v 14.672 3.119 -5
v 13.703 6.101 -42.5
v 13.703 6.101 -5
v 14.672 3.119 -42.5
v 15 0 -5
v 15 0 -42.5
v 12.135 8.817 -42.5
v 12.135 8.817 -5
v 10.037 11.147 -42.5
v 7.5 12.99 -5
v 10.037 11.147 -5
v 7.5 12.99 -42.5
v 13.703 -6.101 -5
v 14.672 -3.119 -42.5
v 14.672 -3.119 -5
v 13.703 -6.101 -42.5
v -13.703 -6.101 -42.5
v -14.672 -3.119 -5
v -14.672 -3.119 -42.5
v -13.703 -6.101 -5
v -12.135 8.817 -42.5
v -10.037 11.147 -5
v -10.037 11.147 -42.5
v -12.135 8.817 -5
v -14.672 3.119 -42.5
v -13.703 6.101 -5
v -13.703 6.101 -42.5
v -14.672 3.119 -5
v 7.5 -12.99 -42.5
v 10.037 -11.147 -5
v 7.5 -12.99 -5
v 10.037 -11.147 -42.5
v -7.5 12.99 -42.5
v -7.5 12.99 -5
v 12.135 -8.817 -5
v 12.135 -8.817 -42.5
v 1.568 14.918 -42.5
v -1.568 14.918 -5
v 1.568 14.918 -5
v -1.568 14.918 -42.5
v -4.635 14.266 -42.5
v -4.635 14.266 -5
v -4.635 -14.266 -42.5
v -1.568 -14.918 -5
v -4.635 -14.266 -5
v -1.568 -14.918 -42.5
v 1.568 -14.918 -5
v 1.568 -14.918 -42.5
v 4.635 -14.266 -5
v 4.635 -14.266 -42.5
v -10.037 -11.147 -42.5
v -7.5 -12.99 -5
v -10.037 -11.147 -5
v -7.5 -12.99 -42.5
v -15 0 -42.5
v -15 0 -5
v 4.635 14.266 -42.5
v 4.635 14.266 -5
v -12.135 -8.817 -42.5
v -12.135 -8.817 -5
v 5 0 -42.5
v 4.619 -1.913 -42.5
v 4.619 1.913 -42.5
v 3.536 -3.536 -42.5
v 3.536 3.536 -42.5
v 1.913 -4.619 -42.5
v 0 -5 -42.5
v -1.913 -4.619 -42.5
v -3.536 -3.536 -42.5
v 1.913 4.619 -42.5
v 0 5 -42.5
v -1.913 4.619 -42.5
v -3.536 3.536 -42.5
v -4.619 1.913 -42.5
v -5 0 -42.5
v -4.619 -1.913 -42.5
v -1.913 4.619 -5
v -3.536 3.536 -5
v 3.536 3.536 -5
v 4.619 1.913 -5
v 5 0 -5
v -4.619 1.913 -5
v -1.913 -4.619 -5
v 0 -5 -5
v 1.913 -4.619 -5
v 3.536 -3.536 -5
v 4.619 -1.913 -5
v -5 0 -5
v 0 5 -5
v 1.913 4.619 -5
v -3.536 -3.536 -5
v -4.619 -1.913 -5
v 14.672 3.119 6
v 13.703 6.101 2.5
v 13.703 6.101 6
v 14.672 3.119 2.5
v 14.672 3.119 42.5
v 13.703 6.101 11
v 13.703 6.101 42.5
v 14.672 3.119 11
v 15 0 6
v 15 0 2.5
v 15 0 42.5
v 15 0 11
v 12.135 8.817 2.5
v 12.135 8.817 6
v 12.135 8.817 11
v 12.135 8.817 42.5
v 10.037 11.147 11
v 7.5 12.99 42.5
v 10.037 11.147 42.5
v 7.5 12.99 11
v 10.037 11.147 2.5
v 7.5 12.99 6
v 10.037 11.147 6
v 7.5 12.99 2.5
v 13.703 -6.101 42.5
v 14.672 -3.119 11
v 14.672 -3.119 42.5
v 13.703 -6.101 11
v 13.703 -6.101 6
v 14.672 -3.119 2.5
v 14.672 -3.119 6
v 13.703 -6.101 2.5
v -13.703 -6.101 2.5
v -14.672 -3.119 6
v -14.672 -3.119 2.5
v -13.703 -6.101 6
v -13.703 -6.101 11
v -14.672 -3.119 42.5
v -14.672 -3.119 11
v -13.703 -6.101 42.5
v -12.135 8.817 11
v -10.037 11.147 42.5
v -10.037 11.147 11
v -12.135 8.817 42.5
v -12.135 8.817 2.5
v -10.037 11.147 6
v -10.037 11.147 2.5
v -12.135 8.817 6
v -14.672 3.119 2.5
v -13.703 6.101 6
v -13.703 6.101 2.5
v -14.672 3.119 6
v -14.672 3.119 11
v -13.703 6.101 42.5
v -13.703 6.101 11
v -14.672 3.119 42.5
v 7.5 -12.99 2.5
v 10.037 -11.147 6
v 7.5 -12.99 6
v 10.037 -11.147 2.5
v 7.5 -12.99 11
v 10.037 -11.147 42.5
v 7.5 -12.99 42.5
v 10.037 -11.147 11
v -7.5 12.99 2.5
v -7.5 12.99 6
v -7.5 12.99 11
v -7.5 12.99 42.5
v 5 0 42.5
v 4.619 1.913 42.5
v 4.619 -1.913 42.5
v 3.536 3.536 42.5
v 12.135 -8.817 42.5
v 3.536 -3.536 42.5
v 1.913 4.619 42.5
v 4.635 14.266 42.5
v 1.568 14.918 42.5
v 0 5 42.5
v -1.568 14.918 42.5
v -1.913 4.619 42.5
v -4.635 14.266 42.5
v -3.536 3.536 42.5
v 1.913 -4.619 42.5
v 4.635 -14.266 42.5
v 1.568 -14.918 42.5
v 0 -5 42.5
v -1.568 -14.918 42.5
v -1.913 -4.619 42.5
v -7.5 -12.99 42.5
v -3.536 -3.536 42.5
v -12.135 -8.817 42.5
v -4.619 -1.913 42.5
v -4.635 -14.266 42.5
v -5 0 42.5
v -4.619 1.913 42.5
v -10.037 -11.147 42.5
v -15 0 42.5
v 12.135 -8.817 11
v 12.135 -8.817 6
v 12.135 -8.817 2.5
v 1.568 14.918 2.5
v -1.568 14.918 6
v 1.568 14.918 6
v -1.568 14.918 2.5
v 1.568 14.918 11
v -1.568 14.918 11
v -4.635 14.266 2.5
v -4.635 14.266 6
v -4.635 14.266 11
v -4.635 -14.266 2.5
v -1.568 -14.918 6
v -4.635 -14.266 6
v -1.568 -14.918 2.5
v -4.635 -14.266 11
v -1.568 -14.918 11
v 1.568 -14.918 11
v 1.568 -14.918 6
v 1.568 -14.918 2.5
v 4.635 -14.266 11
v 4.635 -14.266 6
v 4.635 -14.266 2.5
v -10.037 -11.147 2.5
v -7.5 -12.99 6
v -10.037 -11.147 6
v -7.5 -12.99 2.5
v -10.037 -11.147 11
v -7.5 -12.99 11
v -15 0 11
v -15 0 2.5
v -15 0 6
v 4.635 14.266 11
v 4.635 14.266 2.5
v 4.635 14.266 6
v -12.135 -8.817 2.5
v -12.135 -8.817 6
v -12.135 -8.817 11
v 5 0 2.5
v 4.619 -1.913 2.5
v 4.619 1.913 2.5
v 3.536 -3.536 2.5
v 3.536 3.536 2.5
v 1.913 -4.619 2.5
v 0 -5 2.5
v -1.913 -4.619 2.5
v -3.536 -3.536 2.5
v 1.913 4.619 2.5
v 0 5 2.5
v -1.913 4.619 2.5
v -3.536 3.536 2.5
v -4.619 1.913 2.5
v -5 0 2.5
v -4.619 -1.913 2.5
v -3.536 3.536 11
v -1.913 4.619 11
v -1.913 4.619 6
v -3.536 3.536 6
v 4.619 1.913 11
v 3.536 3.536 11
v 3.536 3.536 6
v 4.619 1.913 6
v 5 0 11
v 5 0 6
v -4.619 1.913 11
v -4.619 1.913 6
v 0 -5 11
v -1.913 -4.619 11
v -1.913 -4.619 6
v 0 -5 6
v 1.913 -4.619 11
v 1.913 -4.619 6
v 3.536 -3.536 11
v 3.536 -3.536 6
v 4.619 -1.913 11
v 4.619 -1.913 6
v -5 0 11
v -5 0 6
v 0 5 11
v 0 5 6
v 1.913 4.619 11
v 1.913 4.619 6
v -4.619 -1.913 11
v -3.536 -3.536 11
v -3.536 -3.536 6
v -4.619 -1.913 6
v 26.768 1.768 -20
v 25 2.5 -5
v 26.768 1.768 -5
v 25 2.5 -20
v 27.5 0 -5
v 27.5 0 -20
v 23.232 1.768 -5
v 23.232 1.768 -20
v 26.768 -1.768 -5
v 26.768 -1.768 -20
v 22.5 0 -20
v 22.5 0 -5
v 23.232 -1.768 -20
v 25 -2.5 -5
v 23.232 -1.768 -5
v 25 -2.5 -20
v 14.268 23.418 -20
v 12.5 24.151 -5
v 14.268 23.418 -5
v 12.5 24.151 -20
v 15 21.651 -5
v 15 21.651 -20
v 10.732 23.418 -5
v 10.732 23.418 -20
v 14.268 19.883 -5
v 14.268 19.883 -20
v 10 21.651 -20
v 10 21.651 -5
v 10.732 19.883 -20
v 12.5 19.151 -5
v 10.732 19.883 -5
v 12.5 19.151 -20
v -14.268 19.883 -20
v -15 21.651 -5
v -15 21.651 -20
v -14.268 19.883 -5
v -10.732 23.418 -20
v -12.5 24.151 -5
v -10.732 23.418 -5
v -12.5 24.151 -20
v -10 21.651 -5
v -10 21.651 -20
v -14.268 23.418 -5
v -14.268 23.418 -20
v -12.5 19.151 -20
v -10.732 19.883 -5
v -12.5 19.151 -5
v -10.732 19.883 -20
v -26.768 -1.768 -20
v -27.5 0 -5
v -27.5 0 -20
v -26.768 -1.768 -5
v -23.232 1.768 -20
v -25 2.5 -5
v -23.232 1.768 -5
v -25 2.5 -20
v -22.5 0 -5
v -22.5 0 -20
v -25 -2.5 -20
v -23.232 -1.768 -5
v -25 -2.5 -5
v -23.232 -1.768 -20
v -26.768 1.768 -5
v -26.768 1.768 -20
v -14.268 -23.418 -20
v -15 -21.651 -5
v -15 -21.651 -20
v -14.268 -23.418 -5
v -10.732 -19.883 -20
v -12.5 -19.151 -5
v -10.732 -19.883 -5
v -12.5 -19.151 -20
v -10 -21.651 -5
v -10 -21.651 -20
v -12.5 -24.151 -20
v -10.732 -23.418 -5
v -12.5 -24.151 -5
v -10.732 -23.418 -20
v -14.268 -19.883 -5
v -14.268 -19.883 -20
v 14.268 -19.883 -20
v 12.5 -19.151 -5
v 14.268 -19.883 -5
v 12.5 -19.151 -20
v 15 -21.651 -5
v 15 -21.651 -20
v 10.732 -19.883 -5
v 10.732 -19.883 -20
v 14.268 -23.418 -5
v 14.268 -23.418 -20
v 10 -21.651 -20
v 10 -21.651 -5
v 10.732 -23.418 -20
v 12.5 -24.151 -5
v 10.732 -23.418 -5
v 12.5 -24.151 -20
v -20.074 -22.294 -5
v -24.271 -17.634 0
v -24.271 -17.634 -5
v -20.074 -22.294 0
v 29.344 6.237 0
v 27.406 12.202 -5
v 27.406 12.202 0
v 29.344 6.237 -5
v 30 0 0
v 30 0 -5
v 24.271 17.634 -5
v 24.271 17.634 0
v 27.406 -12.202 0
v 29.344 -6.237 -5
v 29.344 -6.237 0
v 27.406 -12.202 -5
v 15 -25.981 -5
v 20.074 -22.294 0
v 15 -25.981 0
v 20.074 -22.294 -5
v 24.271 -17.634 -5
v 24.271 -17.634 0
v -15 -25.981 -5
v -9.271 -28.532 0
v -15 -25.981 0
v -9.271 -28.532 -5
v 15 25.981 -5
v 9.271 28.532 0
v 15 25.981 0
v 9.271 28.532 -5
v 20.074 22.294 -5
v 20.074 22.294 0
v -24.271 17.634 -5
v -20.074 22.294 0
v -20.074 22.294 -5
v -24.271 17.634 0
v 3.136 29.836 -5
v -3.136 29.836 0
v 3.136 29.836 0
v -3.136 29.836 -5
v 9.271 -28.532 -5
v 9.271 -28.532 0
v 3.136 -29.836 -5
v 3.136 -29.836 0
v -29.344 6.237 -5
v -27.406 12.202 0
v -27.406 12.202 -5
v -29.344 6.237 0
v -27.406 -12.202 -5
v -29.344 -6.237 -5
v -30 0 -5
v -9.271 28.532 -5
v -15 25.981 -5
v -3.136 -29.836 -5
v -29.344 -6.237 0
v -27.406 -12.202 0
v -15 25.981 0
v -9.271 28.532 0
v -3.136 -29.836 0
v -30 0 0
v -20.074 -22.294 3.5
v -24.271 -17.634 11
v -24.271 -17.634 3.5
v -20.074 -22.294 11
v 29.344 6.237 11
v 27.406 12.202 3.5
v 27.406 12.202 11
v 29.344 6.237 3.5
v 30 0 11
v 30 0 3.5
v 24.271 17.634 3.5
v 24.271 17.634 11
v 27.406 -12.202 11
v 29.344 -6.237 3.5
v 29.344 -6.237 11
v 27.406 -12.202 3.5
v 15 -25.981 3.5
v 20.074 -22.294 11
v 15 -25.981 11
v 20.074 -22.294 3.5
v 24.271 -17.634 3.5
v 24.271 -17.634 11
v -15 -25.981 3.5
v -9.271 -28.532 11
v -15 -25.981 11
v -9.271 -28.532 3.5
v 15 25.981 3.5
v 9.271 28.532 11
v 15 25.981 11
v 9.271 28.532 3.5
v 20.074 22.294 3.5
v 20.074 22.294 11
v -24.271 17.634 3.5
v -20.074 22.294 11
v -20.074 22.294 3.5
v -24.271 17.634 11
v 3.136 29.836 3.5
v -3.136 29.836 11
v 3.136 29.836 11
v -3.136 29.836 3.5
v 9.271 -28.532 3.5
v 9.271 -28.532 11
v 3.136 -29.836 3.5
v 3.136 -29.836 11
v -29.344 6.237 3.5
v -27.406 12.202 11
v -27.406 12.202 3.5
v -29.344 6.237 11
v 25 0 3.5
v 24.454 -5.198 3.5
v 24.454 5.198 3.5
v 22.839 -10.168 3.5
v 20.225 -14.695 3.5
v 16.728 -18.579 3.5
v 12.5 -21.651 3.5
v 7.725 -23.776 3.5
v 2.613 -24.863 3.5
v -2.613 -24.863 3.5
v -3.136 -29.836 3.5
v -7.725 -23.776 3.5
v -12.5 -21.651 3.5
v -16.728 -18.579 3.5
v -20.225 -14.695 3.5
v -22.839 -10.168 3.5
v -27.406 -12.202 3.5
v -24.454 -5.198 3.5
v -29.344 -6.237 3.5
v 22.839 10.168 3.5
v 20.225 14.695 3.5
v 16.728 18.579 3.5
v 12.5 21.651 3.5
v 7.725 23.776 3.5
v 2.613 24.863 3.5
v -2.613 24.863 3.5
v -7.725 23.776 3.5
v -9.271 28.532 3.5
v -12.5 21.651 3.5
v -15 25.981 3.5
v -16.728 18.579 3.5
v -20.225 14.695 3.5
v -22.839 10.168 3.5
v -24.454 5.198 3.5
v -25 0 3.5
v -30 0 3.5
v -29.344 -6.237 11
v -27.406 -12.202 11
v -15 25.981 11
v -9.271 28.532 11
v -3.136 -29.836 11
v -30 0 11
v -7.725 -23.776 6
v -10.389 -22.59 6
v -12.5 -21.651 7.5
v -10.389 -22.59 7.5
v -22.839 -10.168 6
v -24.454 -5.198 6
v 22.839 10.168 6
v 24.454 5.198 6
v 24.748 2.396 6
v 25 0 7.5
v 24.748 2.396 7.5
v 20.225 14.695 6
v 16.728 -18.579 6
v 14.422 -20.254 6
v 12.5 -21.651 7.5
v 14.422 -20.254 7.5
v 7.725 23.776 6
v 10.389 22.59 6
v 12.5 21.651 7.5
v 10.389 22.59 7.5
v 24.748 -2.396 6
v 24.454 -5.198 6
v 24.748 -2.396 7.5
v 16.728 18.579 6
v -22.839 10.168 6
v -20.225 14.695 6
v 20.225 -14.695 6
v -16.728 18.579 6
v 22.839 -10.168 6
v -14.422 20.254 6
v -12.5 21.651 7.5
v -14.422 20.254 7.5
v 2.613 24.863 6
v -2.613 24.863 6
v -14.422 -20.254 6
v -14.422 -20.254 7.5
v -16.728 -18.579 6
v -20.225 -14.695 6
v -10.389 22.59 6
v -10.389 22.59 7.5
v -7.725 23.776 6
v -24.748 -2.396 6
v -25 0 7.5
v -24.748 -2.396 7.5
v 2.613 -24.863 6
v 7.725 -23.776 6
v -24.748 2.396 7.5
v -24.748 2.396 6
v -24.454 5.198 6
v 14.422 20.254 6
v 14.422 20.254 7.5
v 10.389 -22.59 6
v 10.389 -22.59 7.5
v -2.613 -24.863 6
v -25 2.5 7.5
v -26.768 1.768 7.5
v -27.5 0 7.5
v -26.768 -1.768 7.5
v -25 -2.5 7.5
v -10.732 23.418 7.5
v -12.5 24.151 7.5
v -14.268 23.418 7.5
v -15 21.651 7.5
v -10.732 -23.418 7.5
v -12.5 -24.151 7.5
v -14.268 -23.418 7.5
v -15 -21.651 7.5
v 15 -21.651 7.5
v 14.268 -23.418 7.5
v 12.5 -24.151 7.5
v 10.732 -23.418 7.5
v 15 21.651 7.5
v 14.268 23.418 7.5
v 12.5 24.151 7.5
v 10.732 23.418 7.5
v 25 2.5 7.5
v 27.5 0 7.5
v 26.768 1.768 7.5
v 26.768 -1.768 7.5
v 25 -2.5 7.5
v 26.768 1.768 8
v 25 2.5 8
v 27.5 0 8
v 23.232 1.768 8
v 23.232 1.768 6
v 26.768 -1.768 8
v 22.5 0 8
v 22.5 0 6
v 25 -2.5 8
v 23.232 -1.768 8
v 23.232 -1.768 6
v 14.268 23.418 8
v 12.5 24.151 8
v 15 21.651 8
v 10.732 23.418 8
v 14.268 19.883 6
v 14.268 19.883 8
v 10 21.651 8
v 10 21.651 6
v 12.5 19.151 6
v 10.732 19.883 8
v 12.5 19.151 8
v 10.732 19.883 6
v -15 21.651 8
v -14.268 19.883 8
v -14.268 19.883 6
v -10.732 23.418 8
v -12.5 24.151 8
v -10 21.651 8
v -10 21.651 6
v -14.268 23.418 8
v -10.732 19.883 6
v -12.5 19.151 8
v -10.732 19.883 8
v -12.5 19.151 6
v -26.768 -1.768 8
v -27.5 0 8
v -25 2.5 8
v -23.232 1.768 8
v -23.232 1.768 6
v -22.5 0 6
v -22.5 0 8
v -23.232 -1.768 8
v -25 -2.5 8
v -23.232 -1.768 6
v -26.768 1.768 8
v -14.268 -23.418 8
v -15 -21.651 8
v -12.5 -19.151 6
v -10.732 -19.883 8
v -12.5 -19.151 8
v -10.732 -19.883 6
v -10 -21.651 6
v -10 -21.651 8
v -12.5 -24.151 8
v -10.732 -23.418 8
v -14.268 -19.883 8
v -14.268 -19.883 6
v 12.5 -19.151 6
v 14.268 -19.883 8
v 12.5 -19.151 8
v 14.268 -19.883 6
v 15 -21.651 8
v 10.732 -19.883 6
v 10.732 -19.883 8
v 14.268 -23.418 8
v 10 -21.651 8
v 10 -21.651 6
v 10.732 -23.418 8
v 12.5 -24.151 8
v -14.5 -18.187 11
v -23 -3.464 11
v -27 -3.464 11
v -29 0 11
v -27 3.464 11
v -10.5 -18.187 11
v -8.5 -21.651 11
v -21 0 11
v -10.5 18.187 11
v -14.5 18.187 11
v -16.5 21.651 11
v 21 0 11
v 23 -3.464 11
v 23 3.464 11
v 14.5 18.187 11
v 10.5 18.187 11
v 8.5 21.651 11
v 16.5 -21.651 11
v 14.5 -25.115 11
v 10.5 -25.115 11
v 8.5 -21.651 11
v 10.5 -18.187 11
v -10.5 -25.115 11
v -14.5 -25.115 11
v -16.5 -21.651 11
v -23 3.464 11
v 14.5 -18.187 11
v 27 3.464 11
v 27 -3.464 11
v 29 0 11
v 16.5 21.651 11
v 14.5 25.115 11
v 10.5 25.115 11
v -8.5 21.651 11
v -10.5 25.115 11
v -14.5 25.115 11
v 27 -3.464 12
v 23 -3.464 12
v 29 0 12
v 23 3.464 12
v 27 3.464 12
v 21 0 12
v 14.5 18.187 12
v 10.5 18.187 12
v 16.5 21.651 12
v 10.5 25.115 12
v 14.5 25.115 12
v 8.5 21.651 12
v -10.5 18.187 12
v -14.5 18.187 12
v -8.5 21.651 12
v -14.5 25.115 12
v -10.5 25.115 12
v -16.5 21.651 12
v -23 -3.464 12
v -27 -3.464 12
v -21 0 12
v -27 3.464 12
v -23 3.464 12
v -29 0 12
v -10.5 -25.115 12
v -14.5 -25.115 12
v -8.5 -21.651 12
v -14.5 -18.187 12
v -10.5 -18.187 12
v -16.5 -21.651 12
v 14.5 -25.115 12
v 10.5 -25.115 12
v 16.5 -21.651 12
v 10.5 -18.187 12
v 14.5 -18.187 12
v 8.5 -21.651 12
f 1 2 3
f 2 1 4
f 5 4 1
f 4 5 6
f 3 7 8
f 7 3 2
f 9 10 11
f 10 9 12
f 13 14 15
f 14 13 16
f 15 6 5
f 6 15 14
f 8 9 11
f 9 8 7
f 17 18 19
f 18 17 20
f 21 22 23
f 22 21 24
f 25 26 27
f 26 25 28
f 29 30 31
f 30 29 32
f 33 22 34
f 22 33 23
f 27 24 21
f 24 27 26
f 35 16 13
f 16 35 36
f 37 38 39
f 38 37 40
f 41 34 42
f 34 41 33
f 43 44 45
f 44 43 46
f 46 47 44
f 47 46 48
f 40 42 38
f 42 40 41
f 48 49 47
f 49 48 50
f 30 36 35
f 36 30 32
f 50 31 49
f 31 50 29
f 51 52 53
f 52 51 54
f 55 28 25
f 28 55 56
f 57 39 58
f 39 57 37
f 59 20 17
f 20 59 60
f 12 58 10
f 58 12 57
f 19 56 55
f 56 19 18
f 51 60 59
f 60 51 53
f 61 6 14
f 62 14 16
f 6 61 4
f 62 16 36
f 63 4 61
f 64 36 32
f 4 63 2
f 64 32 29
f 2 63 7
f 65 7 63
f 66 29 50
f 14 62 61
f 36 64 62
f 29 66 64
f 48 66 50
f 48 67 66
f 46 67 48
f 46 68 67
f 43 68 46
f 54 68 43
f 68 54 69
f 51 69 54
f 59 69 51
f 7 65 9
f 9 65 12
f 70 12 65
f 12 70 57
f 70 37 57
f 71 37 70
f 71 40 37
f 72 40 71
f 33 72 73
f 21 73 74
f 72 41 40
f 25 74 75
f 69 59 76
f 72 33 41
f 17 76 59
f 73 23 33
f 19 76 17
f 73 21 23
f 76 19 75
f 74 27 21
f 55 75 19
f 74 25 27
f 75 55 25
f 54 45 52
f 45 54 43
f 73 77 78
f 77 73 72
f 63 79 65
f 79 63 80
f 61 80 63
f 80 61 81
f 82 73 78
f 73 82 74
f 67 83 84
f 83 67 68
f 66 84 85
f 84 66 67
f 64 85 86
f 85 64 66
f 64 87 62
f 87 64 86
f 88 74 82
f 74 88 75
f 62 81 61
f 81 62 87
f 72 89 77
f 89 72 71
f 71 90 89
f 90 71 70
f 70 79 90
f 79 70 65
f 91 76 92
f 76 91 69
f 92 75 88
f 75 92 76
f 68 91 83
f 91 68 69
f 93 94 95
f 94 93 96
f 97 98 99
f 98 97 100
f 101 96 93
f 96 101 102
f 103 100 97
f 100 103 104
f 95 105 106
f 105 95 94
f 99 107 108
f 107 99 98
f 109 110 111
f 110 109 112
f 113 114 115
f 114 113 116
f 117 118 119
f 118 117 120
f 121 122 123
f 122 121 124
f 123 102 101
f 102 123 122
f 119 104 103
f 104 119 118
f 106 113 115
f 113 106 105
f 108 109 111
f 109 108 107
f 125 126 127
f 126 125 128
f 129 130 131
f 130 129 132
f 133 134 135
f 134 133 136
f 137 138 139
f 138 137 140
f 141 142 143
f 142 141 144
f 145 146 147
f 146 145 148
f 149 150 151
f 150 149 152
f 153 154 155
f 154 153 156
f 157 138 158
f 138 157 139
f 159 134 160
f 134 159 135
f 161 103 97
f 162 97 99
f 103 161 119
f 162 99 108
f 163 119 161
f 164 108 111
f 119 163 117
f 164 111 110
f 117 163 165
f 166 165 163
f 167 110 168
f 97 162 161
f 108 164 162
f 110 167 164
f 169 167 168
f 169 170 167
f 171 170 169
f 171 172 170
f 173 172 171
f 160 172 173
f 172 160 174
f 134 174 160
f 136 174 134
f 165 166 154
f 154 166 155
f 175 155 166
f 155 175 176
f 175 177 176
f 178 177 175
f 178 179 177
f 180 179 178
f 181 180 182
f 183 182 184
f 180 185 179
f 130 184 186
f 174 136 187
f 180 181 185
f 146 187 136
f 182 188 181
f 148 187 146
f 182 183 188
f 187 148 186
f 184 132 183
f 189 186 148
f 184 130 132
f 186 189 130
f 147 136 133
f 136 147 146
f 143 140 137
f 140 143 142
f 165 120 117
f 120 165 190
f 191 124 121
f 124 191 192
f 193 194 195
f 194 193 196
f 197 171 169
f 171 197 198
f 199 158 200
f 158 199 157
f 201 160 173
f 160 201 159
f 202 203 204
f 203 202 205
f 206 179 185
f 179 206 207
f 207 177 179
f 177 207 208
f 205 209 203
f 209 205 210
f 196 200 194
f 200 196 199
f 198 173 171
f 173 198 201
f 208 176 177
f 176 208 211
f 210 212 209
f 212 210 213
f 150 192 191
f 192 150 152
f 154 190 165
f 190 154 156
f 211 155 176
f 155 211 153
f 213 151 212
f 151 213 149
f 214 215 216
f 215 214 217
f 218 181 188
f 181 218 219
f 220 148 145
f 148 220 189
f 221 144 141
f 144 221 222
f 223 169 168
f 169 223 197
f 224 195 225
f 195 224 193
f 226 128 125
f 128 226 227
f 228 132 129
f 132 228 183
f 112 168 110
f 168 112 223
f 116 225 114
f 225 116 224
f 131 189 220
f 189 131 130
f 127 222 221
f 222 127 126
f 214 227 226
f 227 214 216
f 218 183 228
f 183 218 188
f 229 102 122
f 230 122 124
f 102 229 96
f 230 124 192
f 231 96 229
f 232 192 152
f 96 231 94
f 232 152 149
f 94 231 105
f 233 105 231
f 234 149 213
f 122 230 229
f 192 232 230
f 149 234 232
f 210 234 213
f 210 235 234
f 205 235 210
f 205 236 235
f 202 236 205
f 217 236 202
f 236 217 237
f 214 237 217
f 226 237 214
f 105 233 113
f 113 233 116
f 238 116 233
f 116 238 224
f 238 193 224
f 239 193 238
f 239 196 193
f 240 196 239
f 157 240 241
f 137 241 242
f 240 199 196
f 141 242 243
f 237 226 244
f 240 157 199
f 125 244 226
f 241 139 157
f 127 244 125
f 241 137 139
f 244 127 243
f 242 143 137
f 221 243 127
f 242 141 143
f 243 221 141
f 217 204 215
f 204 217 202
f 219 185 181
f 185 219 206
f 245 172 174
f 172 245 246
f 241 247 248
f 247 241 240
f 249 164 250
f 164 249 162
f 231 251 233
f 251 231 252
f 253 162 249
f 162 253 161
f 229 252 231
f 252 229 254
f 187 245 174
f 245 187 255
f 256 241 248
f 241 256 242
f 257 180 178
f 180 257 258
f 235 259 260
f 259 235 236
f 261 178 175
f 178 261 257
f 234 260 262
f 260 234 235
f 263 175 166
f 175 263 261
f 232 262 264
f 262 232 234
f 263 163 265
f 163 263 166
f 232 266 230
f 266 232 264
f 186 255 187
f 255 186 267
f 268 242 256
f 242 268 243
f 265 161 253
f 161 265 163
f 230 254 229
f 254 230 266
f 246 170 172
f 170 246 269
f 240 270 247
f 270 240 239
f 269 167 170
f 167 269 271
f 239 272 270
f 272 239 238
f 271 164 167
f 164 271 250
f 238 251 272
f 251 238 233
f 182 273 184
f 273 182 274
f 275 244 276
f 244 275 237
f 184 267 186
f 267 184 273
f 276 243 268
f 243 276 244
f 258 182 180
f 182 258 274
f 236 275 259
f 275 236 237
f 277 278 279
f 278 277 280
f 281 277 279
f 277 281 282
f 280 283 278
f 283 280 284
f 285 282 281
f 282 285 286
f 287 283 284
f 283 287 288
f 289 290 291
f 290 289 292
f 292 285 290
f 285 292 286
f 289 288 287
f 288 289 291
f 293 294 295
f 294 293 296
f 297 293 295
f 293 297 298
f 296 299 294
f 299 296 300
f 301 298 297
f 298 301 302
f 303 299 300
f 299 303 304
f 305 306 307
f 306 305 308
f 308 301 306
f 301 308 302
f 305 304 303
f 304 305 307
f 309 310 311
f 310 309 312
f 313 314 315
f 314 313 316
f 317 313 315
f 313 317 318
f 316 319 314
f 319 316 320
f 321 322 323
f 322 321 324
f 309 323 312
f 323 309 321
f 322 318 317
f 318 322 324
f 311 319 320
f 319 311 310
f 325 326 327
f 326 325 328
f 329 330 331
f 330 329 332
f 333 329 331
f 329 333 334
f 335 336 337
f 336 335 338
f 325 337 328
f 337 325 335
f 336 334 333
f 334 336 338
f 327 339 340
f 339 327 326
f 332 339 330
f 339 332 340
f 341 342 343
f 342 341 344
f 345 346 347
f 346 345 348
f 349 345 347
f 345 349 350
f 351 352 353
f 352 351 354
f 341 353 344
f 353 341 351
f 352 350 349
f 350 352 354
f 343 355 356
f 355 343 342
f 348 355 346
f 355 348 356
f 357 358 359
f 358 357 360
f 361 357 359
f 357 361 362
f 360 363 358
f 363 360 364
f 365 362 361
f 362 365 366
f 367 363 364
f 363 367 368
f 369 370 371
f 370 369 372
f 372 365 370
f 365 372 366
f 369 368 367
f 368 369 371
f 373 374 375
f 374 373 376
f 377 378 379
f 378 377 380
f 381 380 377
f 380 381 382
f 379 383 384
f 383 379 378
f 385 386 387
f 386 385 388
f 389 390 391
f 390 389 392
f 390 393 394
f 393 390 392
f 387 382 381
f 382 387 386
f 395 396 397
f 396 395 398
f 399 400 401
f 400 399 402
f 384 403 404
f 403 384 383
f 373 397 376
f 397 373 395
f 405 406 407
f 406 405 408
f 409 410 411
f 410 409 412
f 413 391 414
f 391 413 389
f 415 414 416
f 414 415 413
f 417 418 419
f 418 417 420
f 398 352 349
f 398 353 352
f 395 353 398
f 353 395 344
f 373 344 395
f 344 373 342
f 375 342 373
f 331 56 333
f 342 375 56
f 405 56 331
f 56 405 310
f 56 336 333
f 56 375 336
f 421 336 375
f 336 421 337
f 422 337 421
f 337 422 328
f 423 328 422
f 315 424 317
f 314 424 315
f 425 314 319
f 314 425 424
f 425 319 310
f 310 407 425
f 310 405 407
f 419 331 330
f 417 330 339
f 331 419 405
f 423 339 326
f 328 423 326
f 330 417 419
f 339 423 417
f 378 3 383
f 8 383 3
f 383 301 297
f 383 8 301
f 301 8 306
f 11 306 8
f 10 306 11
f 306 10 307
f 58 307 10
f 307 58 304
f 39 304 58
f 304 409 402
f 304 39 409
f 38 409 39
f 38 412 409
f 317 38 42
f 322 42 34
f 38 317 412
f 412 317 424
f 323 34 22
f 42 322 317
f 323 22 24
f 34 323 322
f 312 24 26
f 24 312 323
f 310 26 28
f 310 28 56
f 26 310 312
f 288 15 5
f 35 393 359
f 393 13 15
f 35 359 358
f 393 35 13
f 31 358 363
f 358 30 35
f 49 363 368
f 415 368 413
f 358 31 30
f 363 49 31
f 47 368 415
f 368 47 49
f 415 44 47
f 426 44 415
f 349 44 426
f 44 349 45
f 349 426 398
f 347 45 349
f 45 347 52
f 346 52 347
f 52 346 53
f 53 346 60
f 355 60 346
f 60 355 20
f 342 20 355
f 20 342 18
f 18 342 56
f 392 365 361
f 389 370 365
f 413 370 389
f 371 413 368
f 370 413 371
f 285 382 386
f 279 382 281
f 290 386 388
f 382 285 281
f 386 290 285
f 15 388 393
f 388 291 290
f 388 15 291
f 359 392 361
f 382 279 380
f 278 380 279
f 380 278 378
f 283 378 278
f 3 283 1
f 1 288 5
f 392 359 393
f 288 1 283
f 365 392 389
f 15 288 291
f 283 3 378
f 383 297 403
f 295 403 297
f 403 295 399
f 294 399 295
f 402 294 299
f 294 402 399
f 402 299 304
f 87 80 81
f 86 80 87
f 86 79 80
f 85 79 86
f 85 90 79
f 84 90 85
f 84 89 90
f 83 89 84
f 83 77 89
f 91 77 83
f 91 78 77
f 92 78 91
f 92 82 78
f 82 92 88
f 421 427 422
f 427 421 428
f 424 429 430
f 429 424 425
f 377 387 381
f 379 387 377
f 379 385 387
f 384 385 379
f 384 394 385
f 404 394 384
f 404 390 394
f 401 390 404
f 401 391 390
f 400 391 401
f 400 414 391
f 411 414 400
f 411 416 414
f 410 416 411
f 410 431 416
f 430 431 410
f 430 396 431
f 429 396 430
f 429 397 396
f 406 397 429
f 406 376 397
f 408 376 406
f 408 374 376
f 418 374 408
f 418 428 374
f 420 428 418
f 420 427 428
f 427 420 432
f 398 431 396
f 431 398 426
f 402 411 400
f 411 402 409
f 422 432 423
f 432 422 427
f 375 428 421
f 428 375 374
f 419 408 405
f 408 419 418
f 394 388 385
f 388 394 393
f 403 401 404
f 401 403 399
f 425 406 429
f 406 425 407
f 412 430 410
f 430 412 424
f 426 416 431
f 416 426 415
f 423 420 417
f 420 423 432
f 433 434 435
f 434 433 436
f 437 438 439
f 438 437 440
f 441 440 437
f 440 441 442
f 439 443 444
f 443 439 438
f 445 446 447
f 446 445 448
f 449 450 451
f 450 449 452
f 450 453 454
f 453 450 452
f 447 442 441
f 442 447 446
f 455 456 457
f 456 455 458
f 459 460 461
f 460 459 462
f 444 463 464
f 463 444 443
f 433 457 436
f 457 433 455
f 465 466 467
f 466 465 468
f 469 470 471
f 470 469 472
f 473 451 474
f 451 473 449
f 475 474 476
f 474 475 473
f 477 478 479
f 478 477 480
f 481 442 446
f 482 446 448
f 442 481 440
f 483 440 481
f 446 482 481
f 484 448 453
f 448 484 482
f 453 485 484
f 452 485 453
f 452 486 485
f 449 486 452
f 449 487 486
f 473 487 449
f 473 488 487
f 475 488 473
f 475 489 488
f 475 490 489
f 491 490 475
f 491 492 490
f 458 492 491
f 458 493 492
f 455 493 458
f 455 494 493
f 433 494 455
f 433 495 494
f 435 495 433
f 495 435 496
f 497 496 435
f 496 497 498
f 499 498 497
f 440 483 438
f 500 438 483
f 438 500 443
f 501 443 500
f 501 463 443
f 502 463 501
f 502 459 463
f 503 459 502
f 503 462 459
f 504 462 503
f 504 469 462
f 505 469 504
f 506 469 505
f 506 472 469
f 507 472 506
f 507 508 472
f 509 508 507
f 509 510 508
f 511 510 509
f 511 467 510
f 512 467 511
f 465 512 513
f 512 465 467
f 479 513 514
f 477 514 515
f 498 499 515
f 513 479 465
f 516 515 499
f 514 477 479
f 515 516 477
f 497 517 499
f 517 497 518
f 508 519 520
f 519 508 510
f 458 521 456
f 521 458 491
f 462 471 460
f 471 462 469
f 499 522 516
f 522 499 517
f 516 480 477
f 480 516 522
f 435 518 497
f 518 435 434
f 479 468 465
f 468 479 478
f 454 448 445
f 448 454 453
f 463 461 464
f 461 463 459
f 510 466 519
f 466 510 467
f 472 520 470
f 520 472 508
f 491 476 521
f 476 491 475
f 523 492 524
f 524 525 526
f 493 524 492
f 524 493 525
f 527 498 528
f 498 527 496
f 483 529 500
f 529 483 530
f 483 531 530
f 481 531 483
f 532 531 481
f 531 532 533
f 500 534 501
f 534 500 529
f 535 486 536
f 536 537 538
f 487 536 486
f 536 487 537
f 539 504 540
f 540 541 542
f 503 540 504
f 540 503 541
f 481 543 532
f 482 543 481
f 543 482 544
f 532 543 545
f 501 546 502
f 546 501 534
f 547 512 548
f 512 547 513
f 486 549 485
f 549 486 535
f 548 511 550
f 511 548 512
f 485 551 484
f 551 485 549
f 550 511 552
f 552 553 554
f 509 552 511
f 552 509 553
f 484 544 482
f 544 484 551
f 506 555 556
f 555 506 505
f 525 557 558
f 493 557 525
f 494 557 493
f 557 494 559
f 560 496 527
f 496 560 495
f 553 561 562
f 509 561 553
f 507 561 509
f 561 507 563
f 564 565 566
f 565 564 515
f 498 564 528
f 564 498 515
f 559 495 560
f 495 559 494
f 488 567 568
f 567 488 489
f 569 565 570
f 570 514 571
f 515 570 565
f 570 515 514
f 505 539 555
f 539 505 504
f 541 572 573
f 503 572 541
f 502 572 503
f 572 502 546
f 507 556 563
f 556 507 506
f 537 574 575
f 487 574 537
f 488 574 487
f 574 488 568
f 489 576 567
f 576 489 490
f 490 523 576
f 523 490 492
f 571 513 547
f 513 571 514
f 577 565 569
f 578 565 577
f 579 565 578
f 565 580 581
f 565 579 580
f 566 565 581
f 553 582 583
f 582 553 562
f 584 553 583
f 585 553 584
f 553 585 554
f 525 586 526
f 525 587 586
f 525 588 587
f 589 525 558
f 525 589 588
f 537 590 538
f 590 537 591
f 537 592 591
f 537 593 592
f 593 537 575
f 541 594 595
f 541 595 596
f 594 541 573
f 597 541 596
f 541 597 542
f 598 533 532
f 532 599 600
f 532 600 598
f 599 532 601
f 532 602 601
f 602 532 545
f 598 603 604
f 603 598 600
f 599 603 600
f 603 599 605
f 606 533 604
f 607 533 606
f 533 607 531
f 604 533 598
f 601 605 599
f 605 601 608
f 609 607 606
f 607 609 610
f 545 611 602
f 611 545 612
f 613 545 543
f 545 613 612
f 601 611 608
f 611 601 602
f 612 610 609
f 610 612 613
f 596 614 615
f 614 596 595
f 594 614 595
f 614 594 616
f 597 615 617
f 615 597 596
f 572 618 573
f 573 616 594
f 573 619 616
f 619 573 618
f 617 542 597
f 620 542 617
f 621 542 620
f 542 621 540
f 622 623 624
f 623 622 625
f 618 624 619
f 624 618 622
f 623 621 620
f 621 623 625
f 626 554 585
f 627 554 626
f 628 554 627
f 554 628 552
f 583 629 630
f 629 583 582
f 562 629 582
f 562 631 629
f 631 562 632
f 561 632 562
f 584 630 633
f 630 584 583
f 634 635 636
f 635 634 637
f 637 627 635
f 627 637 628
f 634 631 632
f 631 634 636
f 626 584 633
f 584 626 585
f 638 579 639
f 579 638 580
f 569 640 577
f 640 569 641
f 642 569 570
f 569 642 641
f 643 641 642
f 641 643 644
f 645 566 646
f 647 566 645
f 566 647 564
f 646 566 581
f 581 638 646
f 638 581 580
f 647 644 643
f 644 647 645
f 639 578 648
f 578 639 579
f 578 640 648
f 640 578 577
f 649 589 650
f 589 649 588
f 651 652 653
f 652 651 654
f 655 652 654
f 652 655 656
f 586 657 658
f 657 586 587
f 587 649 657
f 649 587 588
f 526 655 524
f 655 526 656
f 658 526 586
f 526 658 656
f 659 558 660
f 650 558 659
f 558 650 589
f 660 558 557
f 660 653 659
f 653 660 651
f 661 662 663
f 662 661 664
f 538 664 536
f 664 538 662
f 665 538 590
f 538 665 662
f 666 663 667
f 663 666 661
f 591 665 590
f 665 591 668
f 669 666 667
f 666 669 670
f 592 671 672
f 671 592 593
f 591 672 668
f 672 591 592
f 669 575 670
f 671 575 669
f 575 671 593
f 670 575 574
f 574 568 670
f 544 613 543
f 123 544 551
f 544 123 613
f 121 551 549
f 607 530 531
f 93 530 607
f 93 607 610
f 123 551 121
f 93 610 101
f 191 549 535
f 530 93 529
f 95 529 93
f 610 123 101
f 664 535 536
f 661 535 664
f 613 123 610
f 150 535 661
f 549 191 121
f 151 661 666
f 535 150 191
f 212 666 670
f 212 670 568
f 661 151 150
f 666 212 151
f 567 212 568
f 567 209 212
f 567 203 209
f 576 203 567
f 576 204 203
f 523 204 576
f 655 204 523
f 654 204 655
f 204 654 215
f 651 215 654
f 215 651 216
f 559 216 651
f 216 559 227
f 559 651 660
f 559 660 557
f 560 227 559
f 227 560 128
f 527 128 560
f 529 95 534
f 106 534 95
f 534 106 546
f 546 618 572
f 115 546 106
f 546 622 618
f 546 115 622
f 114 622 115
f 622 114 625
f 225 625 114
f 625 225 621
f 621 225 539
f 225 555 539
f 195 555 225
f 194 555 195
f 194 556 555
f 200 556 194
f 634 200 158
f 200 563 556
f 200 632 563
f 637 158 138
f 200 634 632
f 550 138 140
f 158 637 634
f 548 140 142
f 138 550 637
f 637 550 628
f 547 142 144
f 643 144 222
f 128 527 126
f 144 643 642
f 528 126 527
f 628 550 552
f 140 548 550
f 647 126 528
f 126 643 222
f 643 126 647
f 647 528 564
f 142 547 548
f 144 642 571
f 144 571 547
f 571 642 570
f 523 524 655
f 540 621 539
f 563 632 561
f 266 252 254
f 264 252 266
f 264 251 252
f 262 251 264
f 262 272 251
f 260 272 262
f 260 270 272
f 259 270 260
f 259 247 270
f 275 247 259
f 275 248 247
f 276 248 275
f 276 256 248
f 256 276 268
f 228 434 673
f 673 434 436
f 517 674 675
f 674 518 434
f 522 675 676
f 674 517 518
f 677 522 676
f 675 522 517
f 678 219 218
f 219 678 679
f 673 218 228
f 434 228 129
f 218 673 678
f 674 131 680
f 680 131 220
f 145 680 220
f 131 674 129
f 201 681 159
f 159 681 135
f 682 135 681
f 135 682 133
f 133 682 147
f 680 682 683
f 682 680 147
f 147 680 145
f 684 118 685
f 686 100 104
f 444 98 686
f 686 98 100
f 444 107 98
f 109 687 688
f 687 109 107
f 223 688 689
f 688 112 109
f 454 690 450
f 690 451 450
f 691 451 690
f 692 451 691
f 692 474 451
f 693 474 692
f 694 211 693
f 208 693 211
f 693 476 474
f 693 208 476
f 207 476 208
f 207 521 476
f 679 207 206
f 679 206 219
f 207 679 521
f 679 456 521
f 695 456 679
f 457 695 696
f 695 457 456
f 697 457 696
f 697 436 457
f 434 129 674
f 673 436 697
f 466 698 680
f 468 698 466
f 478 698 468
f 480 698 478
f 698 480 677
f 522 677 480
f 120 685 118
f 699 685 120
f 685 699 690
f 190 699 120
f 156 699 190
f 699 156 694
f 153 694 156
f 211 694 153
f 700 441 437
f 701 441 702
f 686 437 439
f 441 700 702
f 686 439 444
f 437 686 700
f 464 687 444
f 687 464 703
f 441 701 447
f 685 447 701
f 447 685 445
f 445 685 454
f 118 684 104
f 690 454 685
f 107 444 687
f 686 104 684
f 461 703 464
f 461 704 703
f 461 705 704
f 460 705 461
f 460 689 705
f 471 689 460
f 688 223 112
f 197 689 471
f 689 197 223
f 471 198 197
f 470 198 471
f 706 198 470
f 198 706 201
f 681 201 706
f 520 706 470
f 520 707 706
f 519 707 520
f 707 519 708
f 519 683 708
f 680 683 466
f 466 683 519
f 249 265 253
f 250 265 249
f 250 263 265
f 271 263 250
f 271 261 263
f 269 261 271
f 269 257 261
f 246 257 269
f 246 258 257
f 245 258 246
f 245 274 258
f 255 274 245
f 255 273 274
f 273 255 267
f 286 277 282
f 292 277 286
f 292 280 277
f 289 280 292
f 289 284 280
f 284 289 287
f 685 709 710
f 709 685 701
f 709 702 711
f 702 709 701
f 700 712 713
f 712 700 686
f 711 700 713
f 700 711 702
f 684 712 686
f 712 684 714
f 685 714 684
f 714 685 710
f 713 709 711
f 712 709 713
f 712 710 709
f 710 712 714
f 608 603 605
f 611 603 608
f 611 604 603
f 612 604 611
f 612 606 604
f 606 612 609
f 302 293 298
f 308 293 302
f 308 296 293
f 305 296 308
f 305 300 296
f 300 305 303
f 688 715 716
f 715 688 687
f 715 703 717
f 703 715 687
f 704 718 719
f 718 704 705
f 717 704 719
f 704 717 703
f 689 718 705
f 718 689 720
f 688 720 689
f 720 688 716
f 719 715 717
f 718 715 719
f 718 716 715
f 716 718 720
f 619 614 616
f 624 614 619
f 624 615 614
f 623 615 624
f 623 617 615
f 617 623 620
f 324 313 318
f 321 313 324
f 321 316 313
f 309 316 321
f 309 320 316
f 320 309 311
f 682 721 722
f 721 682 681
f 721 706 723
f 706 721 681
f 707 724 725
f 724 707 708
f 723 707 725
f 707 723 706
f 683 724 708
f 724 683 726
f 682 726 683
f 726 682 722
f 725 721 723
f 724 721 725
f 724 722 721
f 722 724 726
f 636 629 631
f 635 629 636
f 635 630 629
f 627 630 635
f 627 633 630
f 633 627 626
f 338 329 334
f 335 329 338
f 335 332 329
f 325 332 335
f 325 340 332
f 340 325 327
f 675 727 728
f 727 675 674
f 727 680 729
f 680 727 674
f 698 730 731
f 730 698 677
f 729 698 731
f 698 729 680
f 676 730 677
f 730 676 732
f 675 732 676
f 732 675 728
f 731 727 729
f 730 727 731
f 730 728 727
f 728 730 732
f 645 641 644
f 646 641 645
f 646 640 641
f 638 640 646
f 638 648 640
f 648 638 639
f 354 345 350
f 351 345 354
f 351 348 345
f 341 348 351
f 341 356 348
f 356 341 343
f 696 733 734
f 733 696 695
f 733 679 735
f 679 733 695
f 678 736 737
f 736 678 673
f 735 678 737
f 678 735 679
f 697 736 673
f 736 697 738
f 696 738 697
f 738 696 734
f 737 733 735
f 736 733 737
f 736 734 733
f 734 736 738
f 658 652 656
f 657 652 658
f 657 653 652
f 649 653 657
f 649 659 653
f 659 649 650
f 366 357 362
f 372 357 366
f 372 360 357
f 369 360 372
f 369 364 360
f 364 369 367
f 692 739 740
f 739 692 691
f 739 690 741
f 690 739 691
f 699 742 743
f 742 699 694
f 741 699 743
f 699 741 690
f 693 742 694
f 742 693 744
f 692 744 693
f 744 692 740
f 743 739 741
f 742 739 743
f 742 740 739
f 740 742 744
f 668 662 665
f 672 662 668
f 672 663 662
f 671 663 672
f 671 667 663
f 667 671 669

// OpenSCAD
// Parameters
hub_diameter = 30;
hub_length = 40;
shaft_hole_diameter = 10;
flange_diameter = 60;
flange_thickness = 5;
bolt_hole_diameter = 5;
bolt_circle_diameter = 50;
spacer_thickness = 2;
bolt_length = 20;
bolt_diameter = 5;
nut_size = 8;
nut_thickness = 4;

// Function to create a hub
module hub() {
    difference() {
        cylinder(d=hub_diameter, h=hub_length, center=true);
        cylinder(d=shaft_hole_diameter, h=hub_length + 2, center=true);
    }
}

// Function to create a flange plate
module flange_plate() {
    difference() {
        cylinder(d=flange_diameter, h=flange_thickness, center=true);
        for (i = [0:5]) {
            angle = i * 60;
            translate([bolt_circle_diameter/2 * cos(angle), bolt_circle_diameter/2 * sin(angle), 0])
                cylinder(d=bolt_hole_diameter, h=flange_thickness + 2, center=true);
        }
    }
}

// Function to create a spacer ring
module spacer_ring() {
    difference() {
        cylinder(d=flange_diameter, h=spacer_thickness, center=true);
        cylinder(d=bolt_circle_diameter, h=spacer_thickness + 2, center=true);
    }
}

// Function to create a bolt
module bolt() {
    cylinder(d=bolt_diameter, h=bolt_length, center=true);
}

// Function to create a nut
module nut() {
    cylinder(d=nut_size, h=nut_thickness, center=true, $fn=6);
}

// Assembly
module coupling() {
    translate([0, 0, -hub_length/2 - flange_thickness/2])
        hub();
    
    translate([0, 0, hub_length/2 + flange_thickness/2])
        hub();
    
    translate([0, 0, -flange_thickness/2])
        flange_plate();
    
    translate([0, 0, flange_thickness/2 + spacer_thickness])
        spacer_ring();
    
    translate([0, 0, flange_thickness/2 + 2 * spacer_thickness])
        spacer_ring();
    
    translate([0, 0, flange_thickness/2 + 3 * spacer_thickness])
        flange_plate();
    
    for (i = [0:5]) {
        angle = i * 60;
        translate([bolt_circle_diameter/2 * cos(angle), bolt_circle_diameter/2 * sin(angle), -bolt_length/2])
            bolt();
        
        translate([bolt_circle_diameter/2 * cos(angle), bolt_circle_diameter/2 * sin(angle), bolt_length/2])
            nut();
    }
}

// Render the coupling
coupling();
